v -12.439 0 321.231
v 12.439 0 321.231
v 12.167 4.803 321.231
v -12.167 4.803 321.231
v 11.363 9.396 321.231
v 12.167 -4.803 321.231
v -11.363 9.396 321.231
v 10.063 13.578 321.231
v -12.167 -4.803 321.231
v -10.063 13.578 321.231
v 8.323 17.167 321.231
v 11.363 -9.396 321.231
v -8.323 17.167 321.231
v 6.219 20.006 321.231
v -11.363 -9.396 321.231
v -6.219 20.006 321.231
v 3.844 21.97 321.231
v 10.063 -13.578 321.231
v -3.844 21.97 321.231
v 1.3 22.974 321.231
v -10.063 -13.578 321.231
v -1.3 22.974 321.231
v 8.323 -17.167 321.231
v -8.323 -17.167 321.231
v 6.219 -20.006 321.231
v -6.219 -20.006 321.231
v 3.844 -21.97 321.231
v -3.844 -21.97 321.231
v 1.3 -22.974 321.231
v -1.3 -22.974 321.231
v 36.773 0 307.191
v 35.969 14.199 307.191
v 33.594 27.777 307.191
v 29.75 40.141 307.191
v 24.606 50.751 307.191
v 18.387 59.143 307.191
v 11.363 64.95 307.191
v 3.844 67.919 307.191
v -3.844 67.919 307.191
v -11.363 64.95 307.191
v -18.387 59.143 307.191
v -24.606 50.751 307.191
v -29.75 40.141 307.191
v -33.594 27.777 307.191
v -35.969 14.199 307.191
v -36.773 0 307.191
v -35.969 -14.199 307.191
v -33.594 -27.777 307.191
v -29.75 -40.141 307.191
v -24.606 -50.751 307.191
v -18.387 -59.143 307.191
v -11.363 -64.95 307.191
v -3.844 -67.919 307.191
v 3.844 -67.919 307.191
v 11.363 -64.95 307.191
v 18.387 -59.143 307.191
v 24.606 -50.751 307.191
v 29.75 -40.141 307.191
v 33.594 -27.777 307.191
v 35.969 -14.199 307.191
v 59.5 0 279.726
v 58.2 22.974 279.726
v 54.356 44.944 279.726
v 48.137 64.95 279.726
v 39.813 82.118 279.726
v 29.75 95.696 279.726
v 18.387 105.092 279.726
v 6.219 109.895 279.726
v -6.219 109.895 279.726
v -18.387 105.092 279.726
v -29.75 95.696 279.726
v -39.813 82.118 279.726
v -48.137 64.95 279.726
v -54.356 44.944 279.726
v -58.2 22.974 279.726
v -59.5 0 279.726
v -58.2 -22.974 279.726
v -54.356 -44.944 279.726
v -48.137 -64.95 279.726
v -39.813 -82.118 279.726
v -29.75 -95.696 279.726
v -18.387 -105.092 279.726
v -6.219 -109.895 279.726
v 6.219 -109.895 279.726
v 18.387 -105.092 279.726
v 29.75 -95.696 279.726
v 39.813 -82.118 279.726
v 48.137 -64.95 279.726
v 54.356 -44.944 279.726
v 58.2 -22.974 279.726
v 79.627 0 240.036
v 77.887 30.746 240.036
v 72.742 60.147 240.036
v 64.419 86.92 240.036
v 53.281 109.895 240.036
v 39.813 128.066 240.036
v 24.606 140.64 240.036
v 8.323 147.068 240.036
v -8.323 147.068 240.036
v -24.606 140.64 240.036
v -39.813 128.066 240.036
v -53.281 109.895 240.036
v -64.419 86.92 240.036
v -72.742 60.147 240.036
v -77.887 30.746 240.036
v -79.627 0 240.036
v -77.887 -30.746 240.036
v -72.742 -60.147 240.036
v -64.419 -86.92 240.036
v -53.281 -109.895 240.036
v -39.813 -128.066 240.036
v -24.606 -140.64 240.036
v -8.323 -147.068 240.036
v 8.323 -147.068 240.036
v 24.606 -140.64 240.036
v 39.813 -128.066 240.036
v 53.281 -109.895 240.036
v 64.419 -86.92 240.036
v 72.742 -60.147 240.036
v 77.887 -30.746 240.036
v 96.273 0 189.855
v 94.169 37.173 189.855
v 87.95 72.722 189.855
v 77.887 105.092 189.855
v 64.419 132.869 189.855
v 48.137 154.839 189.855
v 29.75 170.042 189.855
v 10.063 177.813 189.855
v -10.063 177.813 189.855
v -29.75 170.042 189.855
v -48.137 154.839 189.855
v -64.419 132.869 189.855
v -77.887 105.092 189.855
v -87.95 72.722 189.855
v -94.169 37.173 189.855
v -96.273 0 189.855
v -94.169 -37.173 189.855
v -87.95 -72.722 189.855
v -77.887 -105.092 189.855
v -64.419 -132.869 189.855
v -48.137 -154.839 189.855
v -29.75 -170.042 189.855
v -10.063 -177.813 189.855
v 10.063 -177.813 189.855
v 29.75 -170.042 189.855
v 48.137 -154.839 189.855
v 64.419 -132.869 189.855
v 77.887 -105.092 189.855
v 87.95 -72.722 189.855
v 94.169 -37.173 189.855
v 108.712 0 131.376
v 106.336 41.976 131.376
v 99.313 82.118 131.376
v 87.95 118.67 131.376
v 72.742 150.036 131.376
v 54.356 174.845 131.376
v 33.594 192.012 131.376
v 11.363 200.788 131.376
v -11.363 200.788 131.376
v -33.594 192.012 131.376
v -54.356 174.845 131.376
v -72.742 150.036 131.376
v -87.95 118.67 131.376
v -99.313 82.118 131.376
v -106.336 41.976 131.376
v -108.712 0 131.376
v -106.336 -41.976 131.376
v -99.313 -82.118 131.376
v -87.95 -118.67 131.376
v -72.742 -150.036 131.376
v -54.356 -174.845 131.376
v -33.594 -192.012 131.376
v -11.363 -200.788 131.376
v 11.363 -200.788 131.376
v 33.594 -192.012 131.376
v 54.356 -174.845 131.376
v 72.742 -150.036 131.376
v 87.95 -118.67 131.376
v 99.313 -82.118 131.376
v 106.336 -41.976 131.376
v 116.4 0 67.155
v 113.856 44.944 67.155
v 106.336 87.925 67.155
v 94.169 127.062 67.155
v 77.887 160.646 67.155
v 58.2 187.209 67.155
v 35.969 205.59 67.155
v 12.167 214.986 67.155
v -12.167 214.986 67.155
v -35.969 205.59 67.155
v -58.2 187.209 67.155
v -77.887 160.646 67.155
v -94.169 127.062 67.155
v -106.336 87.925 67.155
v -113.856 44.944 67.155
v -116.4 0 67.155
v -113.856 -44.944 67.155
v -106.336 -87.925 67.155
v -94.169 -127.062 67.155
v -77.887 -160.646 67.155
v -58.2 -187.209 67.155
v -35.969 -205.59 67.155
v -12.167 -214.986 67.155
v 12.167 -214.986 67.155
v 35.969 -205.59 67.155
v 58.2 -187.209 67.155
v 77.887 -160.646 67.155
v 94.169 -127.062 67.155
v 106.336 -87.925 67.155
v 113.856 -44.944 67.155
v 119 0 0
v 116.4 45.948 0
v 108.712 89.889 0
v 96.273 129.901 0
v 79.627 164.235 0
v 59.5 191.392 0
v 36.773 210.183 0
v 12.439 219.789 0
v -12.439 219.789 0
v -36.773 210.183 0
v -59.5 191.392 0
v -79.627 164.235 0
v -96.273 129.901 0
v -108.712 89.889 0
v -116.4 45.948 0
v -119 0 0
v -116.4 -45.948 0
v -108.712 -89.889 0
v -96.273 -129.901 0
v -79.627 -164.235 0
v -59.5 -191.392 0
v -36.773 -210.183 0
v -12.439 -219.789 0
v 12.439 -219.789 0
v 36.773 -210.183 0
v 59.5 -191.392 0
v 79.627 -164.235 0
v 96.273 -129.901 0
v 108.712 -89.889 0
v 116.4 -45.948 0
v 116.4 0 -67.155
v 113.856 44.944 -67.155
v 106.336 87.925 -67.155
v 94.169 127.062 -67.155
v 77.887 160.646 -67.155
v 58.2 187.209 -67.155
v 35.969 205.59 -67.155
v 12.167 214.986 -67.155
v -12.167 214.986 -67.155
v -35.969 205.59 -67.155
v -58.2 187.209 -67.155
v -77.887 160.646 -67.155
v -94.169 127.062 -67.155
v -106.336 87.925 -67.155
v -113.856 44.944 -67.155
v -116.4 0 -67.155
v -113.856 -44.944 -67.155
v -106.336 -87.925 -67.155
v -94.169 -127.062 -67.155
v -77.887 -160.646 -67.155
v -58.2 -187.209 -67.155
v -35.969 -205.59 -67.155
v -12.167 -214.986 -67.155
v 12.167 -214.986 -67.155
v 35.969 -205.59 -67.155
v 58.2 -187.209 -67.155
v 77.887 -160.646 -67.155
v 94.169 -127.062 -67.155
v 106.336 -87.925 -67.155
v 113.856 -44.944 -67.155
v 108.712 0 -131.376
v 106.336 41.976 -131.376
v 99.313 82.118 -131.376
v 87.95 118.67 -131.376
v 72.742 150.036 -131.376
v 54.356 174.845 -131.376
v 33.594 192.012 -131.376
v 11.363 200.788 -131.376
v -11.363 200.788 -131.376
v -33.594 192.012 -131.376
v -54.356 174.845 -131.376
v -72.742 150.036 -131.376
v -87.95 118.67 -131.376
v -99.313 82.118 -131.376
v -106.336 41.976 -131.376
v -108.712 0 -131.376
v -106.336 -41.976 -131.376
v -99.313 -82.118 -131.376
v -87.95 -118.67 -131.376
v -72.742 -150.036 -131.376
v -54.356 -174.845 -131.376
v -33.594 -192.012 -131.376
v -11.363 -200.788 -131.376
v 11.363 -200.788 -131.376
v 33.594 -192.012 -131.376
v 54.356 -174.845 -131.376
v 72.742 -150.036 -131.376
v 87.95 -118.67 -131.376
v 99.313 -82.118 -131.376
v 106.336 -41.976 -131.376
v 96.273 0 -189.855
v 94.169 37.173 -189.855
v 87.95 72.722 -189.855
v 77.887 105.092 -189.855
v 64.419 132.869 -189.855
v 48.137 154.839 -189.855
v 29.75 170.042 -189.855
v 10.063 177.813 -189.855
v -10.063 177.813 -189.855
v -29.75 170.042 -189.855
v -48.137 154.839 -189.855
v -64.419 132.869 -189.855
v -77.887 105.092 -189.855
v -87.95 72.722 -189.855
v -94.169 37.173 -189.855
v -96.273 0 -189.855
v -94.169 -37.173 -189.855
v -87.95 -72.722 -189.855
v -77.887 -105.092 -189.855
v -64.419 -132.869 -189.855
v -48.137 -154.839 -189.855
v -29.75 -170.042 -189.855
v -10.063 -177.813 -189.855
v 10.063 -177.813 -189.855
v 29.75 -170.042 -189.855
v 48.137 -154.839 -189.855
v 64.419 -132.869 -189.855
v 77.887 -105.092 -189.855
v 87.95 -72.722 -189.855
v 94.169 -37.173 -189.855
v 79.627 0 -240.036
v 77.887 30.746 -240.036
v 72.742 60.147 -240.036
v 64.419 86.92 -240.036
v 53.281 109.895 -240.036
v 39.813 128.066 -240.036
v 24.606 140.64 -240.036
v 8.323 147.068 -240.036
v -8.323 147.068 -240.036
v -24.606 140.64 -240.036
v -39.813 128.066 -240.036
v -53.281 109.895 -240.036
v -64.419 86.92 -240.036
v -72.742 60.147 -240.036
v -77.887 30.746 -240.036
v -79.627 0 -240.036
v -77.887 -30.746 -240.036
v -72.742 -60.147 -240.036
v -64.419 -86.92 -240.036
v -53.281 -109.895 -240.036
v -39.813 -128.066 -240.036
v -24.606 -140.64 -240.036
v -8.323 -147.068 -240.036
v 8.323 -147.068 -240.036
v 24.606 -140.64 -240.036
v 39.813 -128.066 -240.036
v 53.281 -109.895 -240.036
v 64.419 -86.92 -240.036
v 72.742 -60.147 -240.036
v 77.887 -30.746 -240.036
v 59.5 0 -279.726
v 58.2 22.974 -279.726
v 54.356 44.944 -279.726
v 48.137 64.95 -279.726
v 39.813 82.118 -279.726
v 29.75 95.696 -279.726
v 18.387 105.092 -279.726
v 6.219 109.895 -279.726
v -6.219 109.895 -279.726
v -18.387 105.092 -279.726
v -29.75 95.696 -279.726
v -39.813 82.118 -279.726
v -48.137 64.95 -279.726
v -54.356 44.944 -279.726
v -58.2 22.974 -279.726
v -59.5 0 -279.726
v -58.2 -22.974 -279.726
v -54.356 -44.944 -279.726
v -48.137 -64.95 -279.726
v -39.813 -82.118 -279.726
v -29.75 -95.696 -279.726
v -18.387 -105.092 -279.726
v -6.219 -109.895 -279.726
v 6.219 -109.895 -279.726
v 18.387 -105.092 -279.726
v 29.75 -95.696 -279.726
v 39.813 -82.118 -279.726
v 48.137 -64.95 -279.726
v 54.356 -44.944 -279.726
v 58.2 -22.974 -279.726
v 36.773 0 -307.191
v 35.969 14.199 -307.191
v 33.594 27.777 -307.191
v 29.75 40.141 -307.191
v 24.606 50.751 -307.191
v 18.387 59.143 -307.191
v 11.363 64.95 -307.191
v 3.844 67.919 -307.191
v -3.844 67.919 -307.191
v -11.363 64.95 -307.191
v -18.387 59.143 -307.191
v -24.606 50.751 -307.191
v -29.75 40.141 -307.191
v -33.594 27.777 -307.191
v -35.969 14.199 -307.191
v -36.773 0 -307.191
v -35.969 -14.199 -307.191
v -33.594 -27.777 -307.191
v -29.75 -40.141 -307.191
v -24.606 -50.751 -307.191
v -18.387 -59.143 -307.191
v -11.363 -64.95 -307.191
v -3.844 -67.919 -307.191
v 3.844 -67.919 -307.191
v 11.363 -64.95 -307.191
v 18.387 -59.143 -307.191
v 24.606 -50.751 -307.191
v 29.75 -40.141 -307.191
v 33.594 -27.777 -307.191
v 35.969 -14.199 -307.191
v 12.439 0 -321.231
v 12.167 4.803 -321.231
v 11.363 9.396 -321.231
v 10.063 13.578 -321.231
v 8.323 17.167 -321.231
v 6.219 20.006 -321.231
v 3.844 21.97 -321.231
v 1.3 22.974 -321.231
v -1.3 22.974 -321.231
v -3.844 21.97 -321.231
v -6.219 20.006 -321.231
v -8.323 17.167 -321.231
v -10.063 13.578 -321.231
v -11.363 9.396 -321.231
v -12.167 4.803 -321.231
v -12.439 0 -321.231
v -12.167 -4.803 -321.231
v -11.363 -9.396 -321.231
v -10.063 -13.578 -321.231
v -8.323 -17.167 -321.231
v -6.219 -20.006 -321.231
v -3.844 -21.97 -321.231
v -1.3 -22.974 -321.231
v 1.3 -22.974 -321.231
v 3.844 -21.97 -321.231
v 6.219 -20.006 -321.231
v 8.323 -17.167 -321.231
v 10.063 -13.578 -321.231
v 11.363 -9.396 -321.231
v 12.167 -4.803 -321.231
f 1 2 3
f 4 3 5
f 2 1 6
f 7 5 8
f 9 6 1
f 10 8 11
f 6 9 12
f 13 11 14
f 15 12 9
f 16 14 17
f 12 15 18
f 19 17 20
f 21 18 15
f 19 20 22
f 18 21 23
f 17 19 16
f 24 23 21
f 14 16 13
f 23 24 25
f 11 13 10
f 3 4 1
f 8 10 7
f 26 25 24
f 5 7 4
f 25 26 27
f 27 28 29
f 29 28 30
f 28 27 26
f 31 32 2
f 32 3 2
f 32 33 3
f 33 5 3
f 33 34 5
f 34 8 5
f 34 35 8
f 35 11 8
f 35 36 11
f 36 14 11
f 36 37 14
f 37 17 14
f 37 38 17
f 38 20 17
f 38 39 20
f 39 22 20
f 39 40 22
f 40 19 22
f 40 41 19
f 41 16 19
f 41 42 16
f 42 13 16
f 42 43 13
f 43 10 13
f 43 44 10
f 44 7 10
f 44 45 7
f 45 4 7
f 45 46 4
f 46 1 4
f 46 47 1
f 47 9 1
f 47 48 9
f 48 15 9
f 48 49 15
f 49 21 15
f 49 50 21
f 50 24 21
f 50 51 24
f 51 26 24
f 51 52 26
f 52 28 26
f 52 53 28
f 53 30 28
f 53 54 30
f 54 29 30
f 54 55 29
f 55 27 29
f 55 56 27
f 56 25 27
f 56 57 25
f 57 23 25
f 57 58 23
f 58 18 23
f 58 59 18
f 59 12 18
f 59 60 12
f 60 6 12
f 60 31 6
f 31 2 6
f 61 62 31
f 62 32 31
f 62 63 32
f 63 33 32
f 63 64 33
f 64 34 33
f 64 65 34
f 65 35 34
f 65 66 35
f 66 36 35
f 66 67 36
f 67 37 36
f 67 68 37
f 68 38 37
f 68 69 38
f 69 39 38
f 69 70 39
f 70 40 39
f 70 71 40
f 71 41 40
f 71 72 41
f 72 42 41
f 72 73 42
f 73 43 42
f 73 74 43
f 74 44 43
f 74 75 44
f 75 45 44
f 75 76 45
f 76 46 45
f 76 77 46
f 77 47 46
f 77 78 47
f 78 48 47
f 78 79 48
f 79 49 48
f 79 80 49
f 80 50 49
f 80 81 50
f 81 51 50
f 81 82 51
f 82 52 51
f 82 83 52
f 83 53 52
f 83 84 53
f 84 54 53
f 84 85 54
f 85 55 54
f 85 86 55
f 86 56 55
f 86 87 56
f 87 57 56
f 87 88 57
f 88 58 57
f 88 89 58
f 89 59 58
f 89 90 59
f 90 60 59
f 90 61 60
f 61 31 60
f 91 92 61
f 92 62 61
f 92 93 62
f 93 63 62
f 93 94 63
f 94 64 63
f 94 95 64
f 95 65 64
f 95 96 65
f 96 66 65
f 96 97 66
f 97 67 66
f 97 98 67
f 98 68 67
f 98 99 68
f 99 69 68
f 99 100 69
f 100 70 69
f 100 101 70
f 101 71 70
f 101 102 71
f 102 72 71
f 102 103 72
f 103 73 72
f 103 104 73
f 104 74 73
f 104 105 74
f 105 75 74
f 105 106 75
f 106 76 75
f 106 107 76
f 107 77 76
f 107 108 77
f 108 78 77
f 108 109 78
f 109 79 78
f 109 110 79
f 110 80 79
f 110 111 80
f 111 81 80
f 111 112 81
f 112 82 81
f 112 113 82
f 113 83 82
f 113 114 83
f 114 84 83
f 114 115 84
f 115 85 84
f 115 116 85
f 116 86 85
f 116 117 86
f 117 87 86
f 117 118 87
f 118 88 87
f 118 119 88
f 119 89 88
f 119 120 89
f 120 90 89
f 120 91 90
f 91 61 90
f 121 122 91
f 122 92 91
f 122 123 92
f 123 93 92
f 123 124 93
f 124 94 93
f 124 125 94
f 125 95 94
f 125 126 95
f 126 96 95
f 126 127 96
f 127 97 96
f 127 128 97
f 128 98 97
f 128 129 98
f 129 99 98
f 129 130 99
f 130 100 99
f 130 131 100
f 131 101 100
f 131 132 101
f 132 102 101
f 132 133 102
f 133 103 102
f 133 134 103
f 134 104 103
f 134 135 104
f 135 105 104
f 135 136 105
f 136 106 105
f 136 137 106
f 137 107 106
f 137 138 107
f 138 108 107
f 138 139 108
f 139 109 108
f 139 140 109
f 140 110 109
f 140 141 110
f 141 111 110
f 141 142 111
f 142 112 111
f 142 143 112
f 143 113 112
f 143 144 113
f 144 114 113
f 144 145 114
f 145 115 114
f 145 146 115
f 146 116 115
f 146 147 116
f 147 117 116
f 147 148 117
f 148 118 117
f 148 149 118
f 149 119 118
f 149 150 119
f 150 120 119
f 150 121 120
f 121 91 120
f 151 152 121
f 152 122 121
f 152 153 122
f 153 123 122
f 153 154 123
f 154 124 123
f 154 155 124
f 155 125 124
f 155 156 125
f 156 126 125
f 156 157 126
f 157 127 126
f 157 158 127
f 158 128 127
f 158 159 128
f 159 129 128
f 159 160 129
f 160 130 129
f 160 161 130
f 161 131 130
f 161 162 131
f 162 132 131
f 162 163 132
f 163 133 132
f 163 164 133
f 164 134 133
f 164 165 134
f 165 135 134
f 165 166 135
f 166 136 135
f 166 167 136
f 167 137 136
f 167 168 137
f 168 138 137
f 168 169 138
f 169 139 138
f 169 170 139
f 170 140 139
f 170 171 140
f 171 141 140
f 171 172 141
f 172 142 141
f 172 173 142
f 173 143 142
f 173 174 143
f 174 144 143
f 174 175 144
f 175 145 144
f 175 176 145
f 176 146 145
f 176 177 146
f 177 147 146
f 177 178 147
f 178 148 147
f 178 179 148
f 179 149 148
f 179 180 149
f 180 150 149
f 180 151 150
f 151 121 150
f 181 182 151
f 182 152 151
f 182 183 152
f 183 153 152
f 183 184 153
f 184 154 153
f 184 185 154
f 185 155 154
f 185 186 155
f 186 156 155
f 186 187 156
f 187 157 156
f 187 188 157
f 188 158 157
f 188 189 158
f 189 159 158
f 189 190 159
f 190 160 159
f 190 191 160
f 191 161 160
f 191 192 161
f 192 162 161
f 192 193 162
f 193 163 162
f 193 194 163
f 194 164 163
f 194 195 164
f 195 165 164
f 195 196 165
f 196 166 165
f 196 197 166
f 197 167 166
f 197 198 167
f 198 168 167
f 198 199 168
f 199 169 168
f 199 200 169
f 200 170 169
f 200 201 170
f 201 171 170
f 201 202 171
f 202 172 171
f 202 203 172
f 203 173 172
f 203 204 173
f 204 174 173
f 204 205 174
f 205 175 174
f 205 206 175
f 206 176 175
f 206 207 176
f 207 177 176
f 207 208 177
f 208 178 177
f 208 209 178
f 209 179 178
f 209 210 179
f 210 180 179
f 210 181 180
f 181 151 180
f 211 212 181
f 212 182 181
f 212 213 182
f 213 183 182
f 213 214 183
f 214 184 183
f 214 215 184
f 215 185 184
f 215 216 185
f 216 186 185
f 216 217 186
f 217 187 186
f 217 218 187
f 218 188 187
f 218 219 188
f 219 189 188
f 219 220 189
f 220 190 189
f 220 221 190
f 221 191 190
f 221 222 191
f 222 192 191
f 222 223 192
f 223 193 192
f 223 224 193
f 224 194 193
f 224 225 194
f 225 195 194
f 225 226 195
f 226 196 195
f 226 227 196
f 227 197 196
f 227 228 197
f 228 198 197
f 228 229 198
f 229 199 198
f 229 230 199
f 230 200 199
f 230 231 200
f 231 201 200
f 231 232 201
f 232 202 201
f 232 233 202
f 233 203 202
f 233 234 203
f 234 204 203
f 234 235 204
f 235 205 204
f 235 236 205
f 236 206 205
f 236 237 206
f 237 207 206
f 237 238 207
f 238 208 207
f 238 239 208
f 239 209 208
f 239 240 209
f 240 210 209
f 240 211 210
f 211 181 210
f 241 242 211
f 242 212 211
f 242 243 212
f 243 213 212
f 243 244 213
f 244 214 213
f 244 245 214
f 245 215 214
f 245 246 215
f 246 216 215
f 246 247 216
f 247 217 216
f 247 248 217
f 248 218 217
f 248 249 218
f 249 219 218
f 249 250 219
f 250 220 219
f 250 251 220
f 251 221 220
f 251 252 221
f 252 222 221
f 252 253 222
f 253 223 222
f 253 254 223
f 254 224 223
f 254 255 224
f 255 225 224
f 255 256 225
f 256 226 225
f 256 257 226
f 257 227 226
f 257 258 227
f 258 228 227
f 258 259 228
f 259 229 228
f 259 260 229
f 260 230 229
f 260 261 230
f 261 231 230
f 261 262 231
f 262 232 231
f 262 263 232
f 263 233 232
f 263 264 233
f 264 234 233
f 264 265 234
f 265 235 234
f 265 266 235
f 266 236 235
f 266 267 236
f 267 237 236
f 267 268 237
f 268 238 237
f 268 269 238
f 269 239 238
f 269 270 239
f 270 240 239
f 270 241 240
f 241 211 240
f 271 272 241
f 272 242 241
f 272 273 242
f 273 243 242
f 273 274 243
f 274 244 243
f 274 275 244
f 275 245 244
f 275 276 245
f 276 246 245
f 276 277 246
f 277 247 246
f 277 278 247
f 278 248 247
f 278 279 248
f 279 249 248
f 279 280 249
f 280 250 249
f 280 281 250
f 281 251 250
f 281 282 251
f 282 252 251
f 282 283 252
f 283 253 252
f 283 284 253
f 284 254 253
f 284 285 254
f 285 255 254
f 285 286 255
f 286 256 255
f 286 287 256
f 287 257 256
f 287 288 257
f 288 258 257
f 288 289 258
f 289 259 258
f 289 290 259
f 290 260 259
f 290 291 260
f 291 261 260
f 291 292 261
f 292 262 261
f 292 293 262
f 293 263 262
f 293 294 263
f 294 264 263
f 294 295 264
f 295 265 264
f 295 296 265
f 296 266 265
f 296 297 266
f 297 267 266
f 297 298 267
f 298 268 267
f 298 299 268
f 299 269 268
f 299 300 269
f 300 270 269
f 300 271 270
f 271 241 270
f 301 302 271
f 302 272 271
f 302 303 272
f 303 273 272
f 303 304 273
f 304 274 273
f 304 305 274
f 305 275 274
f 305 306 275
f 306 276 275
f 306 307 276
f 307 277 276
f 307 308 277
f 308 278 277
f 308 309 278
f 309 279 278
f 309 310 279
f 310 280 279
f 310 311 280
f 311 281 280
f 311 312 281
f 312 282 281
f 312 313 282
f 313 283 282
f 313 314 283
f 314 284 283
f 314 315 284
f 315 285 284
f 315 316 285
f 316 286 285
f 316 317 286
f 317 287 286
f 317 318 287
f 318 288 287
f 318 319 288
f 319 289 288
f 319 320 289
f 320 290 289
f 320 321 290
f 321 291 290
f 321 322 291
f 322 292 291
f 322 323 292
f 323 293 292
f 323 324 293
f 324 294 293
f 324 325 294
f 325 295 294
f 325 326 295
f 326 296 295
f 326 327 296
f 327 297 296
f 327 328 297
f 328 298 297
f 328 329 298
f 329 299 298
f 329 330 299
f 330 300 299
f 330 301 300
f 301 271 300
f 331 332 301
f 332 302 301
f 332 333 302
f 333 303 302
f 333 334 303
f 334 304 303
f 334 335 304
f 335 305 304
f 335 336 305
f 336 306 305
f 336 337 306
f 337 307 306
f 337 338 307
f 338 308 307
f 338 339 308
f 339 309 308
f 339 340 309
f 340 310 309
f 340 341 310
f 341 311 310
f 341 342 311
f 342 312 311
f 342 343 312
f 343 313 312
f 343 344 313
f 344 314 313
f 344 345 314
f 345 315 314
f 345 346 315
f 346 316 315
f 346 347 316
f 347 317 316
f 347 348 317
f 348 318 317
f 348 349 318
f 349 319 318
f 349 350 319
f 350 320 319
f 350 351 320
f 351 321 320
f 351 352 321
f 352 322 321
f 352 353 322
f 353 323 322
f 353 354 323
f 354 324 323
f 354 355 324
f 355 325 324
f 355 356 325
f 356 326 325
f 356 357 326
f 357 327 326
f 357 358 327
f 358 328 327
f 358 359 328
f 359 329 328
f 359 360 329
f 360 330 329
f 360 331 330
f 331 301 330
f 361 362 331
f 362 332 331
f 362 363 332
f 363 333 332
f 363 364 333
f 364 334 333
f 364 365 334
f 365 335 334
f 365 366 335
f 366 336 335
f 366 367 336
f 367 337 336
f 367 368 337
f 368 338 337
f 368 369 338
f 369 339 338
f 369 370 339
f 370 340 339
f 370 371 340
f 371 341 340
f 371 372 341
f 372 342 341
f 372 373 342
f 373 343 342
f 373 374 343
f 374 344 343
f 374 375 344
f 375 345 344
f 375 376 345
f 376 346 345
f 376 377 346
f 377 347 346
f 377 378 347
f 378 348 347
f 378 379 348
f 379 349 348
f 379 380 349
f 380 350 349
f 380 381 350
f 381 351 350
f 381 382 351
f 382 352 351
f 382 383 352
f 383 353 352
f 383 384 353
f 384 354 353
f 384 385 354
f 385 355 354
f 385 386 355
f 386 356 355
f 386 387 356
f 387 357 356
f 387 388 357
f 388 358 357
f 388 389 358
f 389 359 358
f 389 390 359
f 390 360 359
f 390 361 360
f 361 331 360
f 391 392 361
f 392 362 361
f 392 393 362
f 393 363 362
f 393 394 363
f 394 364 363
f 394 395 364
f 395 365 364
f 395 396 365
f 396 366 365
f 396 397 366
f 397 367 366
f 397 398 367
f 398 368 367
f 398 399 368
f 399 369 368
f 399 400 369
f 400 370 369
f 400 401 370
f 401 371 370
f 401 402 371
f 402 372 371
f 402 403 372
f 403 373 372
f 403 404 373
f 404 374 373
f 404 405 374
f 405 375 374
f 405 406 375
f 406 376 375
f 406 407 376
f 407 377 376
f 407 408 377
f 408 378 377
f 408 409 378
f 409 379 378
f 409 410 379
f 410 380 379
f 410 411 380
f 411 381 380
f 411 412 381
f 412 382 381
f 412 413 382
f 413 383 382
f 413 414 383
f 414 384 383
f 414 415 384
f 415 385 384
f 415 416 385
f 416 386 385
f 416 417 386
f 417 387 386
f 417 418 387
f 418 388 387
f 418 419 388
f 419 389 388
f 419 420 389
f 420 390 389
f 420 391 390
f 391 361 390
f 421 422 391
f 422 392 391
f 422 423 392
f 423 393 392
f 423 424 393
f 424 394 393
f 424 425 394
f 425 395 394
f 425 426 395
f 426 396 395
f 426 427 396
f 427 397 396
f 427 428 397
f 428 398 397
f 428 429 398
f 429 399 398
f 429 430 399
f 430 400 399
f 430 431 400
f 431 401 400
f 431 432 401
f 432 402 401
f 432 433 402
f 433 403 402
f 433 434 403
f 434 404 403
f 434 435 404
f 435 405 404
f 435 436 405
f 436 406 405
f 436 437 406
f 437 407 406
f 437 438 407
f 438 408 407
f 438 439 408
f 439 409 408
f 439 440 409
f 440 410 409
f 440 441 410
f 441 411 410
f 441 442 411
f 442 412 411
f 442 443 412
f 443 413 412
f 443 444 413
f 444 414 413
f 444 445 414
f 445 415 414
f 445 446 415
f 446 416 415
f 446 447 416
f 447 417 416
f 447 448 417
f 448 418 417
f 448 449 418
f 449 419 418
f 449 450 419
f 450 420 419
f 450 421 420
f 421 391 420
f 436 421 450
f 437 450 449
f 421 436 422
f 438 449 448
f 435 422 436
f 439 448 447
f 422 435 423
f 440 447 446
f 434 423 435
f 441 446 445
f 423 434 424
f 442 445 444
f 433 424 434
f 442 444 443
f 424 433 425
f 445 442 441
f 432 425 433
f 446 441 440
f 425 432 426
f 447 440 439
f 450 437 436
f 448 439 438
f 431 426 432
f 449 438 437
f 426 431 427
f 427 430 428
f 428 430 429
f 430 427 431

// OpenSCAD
// Generated by SolidPython 1.0.1 on 2020-07-29 00:46:47


scale(v = [7, 13, 19]) {
	sphere(r = 17);
}
/***********************************************
*********      SolidPython code:      **********
************************************************
 
# import packages: SolidPython
from solid import *
from solid.utils import *
from itertools import chain, combinations, permutations


class Resize:

    def __init__(self, scad_file):
        self.scad_file = scad_file
        #self.scad_file = import_scad(scad_file)
        # cone/cylinder param:
        self.r1 = 0
        self.r2 = 0
        self.h = 0
        # rectangular prism param:
        self.w = 0
        self.l = 0
        # ellipse param:
        self.r = 0

    # import OpenScad code (file name corresponds to shape)


    # classify shape + parameters
    def assign(self, param1, param2, param3):
        if self.scad_file == 'cone.scad':
            self.r1 = param1
            self.r2 = param2
            self.h = param3
        elif self.scad_file == 'cylinder.scad':
            self.r1 = param1
            self.r2 = param2
            self.h = param3
        elif self.scad_file == 'rectangularPrism.scad':
            self.h = param1
            self.l = param2
            self.w = param3
        else:
            self.r = param1
            self.h = param2

    # resize parameters
    def iterate(self):
        x = range(3, 20, 2)
        i = 1
        if self.scad_file == 'cone.scad':
            tempList = list(permutations(x, 2))
            for temp in tempList:
                param1 = temp[0]
                param2 = temp[1]
                filepath = 'produced_scad_files/' + 'cone' + str(param1) + '_' + str(param2) + '_' + '.scad'
                scad_render_to_file(cylinder(h=param1, r1=param2, r2=0), filepath)

        elif self.scad_file == 'cylinder.scad':
            tempList = list(permutations(x, 3))
            for temp in tempList:
                param1 = temp[0]
                param2 = temp[1]
                filepath = 'produced_scad_files/' + 'cylinder' + str(param1) + '_' + str(param2) + '_' + '.scad'
                scad_render_to_file(cylinder(h=param1, r1=param2, r2=param2), filepath)

        elif self.scad_file == 'rectangularPrism.scad':
            tempList = list(permutations(x, 3))
            for temp in tempList:
                param1 = temp[0]
                param2 = temp[1]
                param3 = temp[2]
                filepath = 'produced_scad_files/' + 'rectangularPrism' + str(param1) + '_' + str(param2) + '_' + str(
                    param3) + '.scad'
                scad_render_to_file(cube(size=(param1, param2, param3)), filepath)

        elif self.scad_file == 'ellipse.scad':
            tempList = list(permutations(x, 4))
            for temp in tempList:
                param1 = temp[0]
                param2 = temp[1]
                param3 = temp[2]
                param4 = temp[3]
                filepath = 'produced_scad_files/' + 'ellipse' + str(param1) + '_' + str(param2) + '_' + str(param3) + '_' + str(param4) + '.scad'
                scad_render_to_file(scale([param1, param2, param3])(sphere(r=param4)), filepath)

    def render_to_scadfile(self):
        scad_render_to_file(scad, 'example.scad') 
 
************************************************/
